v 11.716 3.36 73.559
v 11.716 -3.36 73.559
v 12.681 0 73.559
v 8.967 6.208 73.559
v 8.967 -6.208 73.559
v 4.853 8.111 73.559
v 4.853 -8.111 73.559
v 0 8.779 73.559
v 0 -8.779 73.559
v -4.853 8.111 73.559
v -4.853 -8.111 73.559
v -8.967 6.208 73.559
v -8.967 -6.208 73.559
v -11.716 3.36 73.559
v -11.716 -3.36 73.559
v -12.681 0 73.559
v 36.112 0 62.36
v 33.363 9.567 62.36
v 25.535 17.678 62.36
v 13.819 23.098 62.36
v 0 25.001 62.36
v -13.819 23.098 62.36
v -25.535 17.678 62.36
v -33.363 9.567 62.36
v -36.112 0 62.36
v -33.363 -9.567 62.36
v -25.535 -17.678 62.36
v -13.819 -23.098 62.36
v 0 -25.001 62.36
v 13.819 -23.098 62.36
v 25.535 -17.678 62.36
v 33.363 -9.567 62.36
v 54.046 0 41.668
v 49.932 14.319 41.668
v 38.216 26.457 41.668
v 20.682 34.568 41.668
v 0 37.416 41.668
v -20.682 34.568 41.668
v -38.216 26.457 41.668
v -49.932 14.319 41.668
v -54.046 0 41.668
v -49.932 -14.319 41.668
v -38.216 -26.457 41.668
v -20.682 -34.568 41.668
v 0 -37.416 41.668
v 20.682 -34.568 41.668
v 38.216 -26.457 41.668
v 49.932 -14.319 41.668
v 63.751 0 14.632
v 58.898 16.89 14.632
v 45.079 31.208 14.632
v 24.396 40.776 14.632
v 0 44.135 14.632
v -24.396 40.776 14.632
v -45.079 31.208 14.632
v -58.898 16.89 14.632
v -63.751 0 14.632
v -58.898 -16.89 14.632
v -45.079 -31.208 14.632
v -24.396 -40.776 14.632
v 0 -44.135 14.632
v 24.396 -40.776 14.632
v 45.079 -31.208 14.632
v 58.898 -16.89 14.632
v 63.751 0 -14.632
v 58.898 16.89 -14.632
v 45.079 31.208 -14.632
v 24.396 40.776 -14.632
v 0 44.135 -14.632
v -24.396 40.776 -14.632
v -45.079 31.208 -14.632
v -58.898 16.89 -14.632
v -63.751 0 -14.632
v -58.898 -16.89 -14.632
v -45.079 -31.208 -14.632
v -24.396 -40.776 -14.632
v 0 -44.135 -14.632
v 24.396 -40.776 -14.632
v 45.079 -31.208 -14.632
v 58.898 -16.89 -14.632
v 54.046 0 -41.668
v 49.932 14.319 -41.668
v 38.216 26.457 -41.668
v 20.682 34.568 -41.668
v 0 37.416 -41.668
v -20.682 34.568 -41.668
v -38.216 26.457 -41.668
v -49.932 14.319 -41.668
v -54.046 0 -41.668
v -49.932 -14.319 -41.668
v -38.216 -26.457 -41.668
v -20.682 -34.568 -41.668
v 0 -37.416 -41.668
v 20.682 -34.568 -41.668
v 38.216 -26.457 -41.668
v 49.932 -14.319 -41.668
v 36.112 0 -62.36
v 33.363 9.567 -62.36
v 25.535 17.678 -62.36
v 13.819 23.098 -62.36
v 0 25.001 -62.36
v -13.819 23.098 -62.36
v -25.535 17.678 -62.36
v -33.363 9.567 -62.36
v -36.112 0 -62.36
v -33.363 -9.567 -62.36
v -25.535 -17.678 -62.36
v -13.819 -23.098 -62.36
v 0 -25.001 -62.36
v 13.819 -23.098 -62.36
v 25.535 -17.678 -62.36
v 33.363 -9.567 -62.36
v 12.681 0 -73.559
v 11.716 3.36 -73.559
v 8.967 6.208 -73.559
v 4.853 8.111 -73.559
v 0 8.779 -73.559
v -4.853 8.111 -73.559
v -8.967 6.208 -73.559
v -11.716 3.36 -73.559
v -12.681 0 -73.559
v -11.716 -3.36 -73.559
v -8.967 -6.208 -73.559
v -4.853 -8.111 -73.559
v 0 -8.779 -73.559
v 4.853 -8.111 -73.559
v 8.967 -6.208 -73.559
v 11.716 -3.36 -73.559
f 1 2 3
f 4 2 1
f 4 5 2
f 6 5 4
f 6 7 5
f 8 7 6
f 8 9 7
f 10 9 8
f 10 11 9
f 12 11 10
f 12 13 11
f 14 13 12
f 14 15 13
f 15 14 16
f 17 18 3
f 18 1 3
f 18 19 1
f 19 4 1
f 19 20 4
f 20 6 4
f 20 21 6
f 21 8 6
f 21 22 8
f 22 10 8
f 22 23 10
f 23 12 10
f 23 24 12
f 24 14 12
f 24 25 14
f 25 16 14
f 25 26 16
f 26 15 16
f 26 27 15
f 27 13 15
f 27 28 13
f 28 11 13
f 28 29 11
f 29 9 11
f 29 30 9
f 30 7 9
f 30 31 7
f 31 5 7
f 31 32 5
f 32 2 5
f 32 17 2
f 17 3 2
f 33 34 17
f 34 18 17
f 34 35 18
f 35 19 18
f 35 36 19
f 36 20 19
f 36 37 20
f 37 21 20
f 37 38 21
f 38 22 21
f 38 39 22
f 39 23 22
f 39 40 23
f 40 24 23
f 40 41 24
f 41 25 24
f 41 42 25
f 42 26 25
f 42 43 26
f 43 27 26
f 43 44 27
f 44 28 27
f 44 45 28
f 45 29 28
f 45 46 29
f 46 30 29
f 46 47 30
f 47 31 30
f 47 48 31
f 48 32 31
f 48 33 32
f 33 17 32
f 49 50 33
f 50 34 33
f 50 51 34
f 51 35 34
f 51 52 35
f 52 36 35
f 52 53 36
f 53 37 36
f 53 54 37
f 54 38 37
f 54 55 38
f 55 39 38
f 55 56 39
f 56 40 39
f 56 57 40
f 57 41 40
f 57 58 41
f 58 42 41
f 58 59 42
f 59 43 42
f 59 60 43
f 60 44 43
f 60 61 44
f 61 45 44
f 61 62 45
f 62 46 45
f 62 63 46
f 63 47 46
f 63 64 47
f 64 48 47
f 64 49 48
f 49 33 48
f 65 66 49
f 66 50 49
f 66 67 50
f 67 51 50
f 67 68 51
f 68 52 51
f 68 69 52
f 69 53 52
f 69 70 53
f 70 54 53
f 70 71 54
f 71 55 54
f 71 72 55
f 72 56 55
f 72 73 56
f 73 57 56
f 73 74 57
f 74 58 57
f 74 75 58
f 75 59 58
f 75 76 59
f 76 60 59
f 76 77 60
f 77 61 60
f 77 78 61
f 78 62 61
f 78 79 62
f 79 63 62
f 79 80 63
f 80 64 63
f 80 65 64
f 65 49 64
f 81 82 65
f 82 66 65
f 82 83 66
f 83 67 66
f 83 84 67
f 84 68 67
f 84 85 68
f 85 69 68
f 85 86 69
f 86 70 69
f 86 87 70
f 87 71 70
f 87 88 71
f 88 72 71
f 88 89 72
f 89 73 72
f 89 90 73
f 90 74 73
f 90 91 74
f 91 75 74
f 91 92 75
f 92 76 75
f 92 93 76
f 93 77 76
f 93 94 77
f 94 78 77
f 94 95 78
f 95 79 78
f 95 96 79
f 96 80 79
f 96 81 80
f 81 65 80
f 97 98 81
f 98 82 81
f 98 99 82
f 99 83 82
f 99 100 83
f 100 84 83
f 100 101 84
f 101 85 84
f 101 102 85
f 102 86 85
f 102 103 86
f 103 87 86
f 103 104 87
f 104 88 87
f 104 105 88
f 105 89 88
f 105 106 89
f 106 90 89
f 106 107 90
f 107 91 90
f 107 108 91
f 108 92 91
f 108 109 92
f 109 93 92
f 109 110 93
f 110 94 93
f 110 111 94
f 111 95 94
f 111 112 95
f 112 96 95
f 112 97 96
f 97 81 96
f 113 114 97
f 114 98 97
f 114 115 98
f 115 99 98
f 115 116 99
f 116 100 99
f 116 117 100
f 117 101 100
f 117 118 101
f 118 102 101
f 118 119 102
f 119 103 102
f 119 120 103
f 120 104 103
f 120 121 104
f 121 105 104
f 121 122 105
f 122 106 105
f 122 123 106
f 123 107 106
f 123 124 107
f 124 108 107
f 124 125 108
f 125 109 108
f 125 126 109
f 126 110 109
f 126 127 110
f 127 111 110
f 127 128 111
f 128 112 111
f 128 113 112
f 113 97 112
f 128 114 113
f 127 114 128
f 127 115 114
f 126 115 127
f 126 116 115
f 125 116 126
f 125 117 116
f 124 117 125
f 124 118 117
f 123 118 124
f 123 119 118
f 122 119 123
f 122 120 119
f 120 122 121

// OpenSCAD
// Generated by SolidPython 1.0.1 on 2020-07-29 00:46:50


scale(v = [13, 9, 15]) {
	sphere(r = 5);
}
/***********************************************
*********      SolidPython code:      **********
************************************************
 
# import packages: SolidPython
from solid import *
from solid.utils import *
from itertools import chain, combinations, permutations


class Resize:

    def __init__(self, scad_file):
        self.scad_file = scad_file
        #self.scad_file = import_scad(scad_file)
        # cone/cylinder param:
        self.r1 = 0
        self.r2 = 0
        self.h = 0
        # rectangular prism param:
        self.w = 0
        self.l = 0
        # ellipse param:
        self.r = 0

    # import OpenScad code (file name corresponds to shape)


    # classify shape + parameters
    def assign(self, param1, param2, param3):
        if self.scad_file == 'cone.scad':
            self.r1 = param1
            self.r2 = param2
            self.h = param3
        elif self.scad_file == 'cylinder.scad':
            self.r1 = param1
            self.r2 = param2
            self.h = param3
        elif self.scad_file == 'rectangularPrism.scad':
            self.h = param1
            self.l = param2
            self.w = param3
        else:
            self.r = param1
            self.h = param2

    # resize parameters
    def iterate(self):
        x = range(3, 20, 2)
        i = 1
        if self.scad_file == 'cone.scad':
            tempList = list(permutations(x, 2))
            for temp in tempList:
                param1 = temp[0]
                param2 = temp[1]
                filepath = 'produced_scad_files/' + 'cone' + str(param1) + '_' + str(param2) + '_' + '.scad'
                scad_render_to_file(cylinder(h=param1, r1=param2, r2=0), filepath)

        elif self.scad_file == 'cylinder.scad':
            tempList = list(permutations(x, 3))
            for temp in tempList:
                param1 = temp[0]
                param2 = temp[1]
                filepath = 'produced_scad_files/' + 'cylinder' + str(param1) + '_' + str(param2) + '_' + '.scad'
                scad_render_to_file(cylinder(h=param1, r1=param2, r2=param2), filepath)

        elif self.scad_file == 'rectangularPrism.scad':
            tempList = list(permutations(x, 3))
            for temp in tempList:
                param1 = temp[0]
                param2 = temp[1]
                param3 = temp[2]
                filepath = 'produced_scad_files/' + 'rectangularPrism' + str(param1) + '_' + str(param2) + '_' + str(
                    param3) + '.scad'
                scad_render_to_file(cube(size=(param1, param2, param3)), filepath)

        elif self.scad_file == 'ellipse.scad':
            tempList = list(permutations(x, 4))
            for temp in tempList:
                param1 = temp[0]
                param2 = temp[1]
                param3 = temp[2]
                param4 = temp[3]
                filepath = 'produced_scad_files/' + 'ellipse' + str(param1) + '_' + str(param2) + '_' + str(param3) + '_' + str(param4) + '.scad'
                scad_render_to_file(scale([param1, param2, param3])(sphere(r=param4)), filepath)

    def render_to_scadfile(self):
        scad_render_to_file(scad, 'example.scad') 
 
************************************************/
